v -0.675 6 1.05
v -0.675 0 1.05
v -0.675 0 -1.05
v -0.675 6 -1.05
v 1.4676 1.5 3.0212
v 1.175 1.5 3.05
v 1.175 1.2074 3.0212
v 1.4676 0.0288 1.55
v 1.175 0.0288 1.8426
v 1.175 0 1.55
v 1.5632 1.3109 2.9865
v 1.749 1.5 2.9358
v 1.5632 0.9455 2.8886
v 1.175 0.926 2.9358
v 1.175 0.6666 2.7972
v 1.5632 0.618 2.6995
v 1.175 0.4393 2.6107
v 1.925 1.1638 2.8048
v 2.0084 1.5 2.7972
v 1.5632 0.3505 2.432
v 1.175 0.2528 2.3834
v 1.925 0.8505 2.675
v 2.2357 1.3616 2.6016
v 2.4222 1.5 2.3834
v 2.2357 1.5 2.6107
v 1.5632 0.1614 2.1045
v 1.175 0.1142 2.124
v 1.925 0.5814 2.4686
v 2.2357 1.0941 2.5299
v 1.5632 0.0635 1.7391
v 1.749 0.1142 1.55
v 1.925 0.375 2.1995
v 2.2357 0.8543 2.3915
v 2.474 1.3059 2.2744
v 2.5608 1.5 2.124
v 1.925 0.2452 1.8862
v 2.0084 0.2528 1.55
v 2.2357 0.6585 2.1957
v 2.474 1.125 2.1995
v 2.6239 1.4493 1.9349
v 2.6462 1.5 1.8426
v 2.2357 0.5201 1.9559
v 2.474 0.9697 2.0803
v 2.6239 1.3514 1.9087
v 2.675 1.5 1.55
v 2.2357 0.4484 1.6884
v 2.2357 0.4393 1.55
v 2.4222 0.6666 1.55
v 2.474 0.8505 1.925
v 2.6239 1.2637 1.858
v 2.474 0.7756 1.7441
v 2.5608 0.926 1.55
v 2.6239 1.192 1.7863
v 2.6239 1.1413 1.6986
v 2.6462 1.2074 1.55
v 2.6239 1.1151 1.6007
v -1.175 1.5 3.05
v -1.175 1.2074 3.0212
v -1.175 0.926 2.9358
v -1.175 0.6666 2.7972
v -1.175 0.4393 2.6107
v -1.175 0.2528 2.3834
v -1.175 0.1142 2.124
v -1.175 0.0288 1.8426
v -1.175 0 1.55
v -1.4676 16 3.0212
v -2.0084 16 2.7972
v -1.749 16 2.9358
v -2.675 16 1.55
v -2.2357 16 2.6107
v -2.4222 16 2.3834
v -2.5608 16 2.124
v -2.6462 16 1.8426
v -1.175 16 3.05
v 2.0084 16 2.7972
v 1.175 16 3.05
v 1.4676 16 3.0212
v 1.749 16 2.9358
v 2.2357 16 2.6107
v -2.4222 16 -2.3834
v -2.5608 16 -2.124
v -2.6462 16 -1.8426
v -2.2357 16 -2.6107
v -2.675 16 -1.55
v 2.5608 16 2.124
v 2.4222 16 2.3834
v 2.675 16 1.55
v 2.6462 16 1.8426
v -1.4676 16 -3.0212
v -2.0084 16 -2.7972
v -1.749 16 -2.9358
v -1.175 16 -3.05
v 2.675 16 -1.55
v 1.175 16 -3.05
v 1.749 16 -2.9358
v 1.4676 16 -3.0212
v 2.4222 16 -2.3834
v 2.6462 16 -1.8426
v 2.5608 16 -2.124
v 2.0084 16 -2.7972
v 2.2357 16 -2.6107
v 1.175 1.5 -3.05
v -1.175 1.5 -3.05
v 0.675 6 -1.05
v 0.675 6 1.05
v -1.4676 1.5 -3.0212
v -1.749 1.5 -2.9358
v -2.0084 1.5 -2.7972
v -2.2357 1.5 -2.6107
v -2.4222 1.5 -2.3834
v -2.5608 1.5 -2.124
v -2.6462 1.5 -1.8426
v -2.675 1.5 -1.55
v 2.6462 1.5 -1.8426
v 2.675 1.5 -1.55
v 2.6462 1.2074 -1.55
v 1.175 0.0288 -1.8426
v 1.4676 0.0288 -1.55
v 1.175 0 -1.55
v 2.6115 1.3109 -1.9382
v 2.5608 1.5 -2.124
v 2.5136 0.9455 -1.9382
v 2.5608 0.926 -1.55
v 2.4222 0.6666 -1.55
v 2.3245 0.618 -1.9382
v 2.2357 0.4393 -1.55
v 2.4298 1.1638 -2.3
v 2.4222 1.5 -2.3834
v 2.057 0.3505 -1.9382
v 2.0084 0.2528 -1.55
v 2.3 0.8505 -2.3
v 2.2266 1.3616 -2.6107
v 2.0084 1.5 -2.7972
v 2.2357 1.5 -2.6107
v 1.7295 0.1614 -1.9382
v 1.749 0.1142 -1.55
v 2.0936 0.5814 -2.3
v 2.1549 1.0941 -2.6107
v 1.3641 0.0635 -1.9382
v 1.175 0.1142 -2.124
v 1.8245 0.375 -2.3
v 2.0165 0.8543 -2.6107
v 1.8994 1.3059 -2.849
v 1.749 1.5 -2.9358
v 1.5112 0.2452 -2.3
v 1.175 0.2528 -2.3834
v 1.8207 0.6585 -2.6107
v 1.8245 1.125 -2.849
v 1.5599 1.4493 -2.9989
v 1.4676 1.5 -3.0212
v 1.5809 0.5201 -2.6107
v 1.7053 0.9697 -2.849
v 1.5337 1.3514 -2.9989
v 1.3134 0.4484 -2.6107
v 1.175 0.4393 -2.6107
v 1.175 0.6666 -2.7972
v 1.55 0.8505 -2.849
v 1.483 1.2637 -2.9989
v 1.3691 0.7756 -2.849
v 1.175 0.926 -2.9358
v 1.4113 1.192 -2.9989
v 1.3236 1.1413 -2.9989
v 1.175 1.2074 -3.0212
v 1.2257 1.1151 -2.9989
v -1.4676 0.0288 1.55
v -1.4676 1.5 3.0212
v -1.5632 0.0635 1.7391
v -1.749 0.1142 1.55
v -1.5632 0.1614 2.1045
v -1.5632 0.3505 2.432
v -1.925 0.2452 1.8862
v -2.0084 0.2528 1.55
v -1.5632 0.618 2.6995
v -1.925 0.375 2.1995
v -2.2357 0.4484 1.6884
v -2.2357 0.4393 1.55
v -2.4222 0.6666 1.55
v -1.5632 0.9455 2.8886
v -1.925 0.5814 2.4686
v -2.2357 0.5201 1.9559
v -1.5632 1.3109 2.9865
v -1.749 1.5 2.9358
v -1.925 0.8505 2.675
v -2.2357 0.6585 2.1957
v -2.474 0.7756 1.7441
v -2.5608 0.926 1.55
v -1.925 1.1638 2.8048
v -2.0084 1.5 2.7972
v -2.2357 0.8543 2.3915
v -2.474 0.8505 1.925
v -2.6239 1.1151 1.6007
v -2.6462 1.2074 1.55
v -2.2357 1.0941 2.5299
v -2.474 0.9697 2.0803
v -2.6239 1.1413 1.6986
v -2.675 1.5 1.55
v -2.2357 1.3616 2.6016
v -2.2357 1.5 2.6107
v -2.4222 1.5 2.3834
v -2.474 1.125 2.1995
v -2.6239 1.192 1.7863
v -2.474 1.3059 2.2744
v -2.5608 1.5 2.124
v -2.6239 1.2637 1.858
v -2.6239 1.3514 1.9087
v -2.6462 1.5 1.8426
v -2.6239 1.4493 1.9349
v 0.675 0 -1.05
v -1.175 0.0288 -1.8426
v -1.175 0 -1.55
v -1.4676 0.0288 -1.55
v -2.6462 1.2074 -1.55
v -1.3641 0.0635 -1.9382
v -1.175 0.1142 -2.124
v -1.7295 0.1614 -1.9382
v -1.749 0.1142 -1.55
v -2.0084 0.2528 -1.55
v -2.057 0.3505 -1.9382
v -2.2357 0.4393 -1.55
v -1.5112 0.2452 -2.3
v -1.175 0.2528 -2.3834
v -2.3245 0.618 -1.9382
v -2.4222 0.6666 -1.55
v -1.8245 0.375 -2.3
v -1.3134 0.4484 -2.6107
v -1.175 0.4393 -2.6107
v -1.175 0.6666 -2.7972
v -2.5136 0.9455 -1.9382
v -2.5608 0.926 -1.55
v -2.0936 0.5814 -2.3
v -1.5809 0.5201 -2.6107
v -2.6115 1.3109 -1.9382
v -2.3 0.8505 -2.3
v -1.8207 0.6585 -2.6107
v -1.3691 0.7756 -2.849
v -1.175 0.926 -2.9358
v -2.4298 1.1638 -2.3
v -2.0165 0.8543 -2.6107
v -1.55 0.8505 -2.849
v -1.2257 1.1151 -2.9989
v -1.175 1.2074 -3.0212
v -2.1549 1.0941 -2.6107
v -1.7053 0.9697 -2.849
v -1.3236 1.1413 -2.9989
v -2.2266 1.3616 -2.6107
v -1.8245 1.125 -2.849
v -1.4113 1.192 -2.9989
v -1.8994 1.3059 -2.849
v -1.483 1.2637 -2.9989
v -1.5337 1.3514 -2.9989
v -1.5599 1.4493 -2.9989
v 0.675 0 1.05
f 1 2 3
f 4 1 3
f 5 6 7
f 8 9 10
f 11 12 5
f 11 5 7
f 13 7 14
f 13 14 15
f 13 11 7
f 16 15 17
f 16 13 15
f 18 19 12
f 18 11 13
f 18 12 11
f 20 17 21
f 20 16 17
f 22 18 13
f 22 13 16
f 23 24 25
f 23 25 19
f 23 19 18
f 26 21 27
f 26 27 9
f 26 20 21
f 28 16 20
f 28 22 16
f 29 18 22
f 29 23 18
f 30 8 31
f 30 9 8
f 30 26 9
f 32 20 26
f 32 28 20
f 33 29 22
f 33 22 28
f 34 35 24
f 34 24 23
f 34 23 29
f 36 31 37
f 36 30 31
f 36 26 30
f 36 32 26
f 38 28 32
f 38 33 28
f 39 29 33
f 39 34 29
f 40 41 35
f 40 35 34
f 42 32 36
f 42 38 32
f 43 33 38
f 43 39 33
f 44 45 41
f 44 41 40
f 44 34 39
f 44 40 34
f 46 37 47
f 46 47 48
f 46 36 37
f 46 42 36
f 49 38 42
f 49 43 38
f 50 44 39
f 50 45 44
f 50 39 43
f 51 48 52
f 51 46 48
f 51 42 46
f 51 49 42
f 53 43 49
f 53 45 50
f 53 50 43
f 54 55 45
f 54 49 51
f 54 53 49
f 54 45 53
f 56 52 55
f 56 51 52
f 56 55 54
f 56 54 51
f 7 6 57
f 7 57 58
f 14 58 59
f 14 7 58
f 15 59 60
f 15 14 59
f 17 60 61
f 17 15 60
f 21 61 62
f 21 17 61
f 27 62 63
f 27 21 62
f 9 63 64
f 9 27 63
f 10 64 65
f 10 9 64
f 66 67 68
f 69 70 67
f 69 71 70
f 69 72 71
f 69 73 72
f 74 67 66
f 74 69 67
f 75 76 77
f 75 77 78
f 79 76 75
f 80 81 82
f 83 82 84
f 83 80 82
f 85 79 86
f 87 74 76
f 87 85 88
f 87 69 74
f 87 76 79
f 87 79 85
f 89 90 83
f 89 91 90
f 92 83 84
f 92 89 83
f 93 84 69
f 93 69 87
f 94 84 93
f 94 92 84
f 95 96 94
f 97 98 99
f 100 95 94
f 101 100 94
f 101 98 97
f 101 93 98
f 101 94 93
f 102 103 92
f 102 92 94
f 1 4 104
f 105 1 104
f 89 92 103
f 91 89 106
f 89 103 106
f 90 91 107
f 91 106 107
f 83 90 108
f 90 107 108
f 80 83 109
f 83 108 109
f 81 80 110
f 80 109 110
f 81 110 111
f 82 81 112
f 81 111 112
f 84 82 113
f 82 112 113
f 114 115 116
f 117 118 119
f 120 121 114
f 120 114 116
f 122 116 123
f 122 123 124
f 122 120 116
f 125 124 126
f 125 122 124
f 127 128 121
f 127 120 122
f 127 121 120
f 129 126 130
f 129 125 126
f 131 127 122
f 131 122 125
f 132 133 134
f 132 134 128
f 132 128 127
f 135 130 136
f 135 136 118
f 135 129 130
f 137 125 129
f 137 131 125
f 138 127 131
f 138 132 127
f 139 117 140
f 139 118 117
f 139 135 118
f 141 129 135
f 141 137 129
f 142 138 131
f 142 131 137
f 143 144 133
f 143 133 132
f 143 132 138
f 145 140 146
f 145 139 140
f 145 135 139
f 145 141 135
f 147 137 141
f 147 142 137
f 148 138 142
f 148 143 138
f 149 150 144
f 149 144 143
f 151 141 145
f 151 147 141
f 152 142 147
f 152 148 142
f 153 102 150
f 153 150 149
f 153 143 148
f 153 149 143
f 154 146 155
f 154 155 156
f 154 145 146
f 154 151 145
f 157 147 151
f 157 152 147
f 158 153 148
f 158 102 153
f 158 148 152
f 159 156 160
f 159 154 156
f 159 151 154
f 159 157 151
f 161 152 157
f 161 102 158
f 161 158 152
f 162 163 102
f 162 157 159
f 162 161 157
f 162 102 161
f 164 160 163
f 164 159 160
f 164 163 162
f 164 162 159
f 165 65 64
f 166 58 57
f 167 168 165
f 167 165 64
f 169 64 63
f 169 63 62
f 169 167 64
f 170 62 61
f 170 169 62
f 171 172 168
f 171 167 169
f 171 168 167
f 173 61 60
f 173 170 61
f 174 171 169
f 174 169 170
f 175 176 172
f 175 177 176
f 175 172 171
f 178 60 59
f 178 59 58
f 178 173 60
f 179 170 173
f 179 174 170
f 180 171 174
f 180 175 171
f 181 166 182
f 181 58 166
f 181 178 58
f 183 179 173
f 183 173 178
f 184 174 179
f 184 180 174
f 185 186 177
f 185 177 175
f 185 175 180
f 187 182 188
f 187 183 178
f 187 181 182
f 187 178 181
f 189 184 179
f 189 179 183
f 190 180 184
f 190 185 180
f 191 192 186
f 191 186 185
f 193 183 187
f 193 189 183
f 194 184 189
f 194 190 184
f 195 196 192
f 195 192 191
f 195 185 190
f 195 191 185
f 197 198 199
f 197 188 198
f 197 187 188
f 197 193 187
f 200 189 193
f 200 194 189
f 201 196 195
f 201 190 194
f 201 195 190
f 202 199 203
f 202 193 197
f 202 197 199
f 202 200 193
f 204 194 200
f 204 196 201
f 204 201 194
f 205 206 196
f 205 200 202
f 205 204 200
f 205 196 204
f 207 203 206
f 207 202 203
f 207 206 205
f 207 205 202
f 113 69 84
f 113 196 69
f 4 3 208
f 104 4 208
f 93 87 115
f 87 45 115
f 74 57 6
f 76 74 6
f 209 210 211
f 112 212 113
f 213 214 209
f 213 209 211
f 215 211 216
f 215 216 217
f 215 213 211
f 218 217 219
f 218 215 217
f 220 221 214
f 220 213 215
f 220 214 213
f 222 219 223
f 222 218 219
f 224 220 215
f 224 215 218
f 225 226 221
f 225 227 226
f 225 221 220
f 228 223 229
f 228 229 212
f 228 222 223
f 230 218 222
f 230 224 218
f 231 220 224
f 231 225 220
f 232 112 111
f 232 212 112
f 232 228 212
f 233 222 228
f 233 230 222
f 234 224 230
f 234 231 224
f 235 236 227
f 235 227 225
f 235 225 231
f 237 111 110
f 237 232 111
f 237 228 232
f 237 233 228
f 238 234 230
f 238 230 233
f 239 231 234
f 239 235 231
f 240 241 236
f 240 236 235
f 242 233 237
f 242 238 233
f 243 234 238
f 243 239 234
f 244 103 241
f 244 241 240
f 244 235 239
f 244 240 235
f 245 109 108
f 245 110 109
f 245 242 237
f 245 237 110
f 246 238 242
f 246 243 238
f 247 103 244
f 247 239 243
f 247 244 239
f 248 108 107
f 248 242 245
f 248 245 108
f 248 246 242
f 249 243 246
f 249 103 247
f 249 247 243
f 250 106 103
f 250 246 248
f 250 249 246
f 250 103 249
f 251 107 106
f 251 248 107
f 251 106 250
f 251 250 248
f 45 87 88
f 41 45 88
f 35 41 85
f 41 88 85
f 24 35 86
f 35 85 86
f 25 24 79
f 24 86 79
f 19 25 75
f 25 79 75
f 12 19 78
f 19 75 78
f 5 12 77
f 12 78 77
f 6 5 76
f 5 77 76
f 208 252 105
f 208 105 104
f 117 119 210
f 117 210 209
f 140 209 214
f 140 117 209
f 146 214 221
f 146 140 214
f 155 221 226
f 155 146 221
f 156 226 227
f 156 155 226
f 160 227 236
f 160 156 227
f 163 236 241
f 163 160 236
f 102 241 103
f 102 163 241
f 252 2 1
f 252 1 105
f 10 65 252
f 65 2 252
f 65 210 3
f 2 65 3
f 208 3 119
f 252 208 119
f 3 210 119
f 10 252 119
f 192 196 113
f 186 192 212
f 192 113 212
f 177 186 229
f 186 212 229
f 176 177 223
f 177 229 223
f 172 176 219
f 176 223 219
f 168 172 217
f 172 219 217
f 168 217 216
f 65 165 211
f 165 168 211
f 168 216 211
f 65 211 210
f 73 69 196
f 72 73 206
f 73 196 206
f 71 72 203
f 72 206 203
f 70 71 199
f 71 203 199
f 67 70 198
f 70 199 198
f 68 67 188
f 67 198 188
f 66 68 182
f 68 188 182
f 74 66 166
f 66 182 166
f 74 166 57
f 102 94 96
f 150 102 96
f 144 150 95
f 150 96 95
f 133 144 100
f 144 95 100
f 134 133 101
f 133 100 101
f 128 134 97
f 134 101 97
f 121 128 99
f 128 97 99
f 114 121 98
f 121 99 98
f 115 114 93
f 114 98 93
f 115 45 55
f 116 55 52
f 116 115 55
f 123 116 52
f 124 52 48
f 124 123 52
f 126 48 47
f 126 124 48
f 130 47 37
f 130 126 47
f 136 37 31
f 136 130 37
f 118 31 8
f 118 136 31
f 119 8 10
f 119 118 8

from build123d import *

# Parameters (mm, degrees)
SKETCH1_W           = 5.35
SKETCH1_H           = 6.1
SKETCH1_W_2         = 1.35
SKETCH1_H_2         = 2.1
BOSS_EXTRUDE1_DEPTH = 6
SKETCH2_W           = 5.35
SKETCH2_H           = 6.1
BOSS_EXTRUDE2_DEPTH = 10
FILLET1_R           = 1.5
FILLET2_R           = 1.5


with BuildPart() as part:
    # Sketch1 → Boss-Extrude1 (new body)
    with BuildSketch(Plane(origin=(0, 0, 0), x_dir=(1, 0, 0), z_dir=(0, 1, 0))):
        Rectangle(SKETCH1_W, SKETCH1_H)
        Rectangle(SKETCH1_W_2, SKETCH1_H_2, mode=Mode.SUBTRACT)
    extrude(amount=BOSS_EXTRUDE1_DEPTH)

    # Sketch2 → Boss-Extrude2 (add)
    with BuildSketch(Plane(origin=(0, 6, 0), x_dir=(1, 0, 0), z_dir=(0, 1, 0))):
        Rectangle(SKETCH2_W, SKETCH2_H)
    extrude(amount=BOSS_EXTRUDE2_DEPTH)

    # Fillet1
    fillet1_edges = [part.edges().sort_by_distance(p)[0] for p in [
        (0, 0, -3.05),
        (2.675, 0, 0),
        (0, 0, 3.05),
        (-2.675, 0, 0),
    ]]
    fillet(fillet1_edges, radius=FILLET1_R)

    # Fillet2
    # the kernel refuses this fillet: 1.5 mm, written as the material it takes off along each edge
    with BuildSketch(Plane(origin=(1.175, 1.5, -1.55), x_dir=(1, 0, 0), z_dir=(0, 0, -1))) as fillet2_piece_1_section:
        Polygon((0, 0), (FILLET2_R, 0), (FILLET2_R, FILLET2_R), (0, FILLET2_R), align=None)
    fillet2_piece_1 = extrude(amount=FILLET2_R, mode=Mode.PRIVATE)
    fillet2_piece_1 = fillet2_piece_1 - Plane(origin=(1.175, 1.5, -1.55), x_dir=(-0.7071067811865475, 0.7071067811865475, 0), z_dir=(0, 0, -1)) * Sphere(FILLET2_R, mode=Mode.PRIVATE)
    add(fillet2_piece_1, mode=Mode.SUBTRACT)
    with BuildSketch(Plane(origin=(1.175, 1.5, 1.55), x_dir=(0, 0, 1), z_dir=(1, 0, 0))) as fillet2_piece_2_section:
        Polygon((0, 0), (FILLET2_R, 0), (FILLET2_R, FILLET2_R), (0, FILLET2_R), align=None)
    fillet2_piece_2 = extrude(amount=FILLET2_R, mode=Mode.PRIVATE)
    fillet2_piece_2 = fillet2_piece_2 - Plane(origin=(1.175, 1.5, 1.55), x_dir=(0, 0.7071067811865475, -0.7071067811865475), z_dir=(1, 0, 0)) * Sphere(FILLET2_R, mode=Mode.PRIVATE)
    add(fillet2_piece_2, mode=Mode.SUBTRACT)
    with BuildSketch(Plane(origin=(-1.175, 1.5, -1.55), x_dir=(-1, 0, 0), z_dir=(0, 0, -1))) as fillet2_piece_3_section:
        Polygon((0, 0), (FILLET2_R, 0), (FILLET2_R, -FILLET2_R), (0, -FILLET2_R), align=None)
    fillet2_piece_3 = extrude(amount=FILLET2_R, mode=Mode.PRIVATE)
    fillet2_piece_3 = fillet2_piece_3 - Plane(origin=(-1.175, 1.5, -1.55), x_dir=(0.7071067811865475, 0.7071067811865475, 0), z_dir=(0, 0, -1)) * Sphere(FILLET2_R, mode=Mode.PRIVATE)
    add(fillet2_piece_3, mode=Mode.SUBTRACT)
    with BuildSketch(Plane(origin=(-1.175, 1.5, 1.55), x_dir=(0, 0, 1), z_dir=(-1, 0, 0))) as fillet2_piece_4_section:
        Polygon((0, 0), (FILLET2_R, 0), (FILLET2_R, -FILLET2_R), (0, -FILLET2_R), align=None)
    fillet2_piece_4 = extrude(amount=FILLET2_R, mode=Mode.PRIVATE)
    fillet2_piece_4 = fillet2_piece_4 - Plane(origin=(-1.175, 1.5, 1.55), x_dir=(0, 0.7071067811865475, -0.7071067811865475), z_dir=(-1, 0, 0)) * Sphere(FILLET2_R, mode=Mode.PRIVATE)
    add(fillet2_piece_4, mode=Mode.SUBTRACT)
    with BuildSketch(Plane(origin=(-2.675, 1.5, -3.05), x_dir=(1, 0, 0), z_dir=(0, 1, 0)), Plane(origin=(2.675, 19.75, -3.05), x_dir=(-1, 0, 0), z_dir=(0, -1, 0)), Plane(origin=(2.675, 19.75, 3.05), x_dir=(0, 0, -1), z_dir=(0, -1, 0)), Plane(origin=(-2.675, 1.5, 3.05), x_dir=(0, 0, -1), z_dir=(0, 1, 0))) as fillet2_piece_5:
        with BuildLine():
            CenterArc((FILLET2_R, -FILLET2_R), FILLET2_R, 90, 90)
            Line((0, -FILLET2_R), (0, 0))
            Line((0, 0), (FILLET2_R, 0))
        make_face()
    extrude(amount=18.25, mode=Mode.SUBTRACT)


solid = part.part
